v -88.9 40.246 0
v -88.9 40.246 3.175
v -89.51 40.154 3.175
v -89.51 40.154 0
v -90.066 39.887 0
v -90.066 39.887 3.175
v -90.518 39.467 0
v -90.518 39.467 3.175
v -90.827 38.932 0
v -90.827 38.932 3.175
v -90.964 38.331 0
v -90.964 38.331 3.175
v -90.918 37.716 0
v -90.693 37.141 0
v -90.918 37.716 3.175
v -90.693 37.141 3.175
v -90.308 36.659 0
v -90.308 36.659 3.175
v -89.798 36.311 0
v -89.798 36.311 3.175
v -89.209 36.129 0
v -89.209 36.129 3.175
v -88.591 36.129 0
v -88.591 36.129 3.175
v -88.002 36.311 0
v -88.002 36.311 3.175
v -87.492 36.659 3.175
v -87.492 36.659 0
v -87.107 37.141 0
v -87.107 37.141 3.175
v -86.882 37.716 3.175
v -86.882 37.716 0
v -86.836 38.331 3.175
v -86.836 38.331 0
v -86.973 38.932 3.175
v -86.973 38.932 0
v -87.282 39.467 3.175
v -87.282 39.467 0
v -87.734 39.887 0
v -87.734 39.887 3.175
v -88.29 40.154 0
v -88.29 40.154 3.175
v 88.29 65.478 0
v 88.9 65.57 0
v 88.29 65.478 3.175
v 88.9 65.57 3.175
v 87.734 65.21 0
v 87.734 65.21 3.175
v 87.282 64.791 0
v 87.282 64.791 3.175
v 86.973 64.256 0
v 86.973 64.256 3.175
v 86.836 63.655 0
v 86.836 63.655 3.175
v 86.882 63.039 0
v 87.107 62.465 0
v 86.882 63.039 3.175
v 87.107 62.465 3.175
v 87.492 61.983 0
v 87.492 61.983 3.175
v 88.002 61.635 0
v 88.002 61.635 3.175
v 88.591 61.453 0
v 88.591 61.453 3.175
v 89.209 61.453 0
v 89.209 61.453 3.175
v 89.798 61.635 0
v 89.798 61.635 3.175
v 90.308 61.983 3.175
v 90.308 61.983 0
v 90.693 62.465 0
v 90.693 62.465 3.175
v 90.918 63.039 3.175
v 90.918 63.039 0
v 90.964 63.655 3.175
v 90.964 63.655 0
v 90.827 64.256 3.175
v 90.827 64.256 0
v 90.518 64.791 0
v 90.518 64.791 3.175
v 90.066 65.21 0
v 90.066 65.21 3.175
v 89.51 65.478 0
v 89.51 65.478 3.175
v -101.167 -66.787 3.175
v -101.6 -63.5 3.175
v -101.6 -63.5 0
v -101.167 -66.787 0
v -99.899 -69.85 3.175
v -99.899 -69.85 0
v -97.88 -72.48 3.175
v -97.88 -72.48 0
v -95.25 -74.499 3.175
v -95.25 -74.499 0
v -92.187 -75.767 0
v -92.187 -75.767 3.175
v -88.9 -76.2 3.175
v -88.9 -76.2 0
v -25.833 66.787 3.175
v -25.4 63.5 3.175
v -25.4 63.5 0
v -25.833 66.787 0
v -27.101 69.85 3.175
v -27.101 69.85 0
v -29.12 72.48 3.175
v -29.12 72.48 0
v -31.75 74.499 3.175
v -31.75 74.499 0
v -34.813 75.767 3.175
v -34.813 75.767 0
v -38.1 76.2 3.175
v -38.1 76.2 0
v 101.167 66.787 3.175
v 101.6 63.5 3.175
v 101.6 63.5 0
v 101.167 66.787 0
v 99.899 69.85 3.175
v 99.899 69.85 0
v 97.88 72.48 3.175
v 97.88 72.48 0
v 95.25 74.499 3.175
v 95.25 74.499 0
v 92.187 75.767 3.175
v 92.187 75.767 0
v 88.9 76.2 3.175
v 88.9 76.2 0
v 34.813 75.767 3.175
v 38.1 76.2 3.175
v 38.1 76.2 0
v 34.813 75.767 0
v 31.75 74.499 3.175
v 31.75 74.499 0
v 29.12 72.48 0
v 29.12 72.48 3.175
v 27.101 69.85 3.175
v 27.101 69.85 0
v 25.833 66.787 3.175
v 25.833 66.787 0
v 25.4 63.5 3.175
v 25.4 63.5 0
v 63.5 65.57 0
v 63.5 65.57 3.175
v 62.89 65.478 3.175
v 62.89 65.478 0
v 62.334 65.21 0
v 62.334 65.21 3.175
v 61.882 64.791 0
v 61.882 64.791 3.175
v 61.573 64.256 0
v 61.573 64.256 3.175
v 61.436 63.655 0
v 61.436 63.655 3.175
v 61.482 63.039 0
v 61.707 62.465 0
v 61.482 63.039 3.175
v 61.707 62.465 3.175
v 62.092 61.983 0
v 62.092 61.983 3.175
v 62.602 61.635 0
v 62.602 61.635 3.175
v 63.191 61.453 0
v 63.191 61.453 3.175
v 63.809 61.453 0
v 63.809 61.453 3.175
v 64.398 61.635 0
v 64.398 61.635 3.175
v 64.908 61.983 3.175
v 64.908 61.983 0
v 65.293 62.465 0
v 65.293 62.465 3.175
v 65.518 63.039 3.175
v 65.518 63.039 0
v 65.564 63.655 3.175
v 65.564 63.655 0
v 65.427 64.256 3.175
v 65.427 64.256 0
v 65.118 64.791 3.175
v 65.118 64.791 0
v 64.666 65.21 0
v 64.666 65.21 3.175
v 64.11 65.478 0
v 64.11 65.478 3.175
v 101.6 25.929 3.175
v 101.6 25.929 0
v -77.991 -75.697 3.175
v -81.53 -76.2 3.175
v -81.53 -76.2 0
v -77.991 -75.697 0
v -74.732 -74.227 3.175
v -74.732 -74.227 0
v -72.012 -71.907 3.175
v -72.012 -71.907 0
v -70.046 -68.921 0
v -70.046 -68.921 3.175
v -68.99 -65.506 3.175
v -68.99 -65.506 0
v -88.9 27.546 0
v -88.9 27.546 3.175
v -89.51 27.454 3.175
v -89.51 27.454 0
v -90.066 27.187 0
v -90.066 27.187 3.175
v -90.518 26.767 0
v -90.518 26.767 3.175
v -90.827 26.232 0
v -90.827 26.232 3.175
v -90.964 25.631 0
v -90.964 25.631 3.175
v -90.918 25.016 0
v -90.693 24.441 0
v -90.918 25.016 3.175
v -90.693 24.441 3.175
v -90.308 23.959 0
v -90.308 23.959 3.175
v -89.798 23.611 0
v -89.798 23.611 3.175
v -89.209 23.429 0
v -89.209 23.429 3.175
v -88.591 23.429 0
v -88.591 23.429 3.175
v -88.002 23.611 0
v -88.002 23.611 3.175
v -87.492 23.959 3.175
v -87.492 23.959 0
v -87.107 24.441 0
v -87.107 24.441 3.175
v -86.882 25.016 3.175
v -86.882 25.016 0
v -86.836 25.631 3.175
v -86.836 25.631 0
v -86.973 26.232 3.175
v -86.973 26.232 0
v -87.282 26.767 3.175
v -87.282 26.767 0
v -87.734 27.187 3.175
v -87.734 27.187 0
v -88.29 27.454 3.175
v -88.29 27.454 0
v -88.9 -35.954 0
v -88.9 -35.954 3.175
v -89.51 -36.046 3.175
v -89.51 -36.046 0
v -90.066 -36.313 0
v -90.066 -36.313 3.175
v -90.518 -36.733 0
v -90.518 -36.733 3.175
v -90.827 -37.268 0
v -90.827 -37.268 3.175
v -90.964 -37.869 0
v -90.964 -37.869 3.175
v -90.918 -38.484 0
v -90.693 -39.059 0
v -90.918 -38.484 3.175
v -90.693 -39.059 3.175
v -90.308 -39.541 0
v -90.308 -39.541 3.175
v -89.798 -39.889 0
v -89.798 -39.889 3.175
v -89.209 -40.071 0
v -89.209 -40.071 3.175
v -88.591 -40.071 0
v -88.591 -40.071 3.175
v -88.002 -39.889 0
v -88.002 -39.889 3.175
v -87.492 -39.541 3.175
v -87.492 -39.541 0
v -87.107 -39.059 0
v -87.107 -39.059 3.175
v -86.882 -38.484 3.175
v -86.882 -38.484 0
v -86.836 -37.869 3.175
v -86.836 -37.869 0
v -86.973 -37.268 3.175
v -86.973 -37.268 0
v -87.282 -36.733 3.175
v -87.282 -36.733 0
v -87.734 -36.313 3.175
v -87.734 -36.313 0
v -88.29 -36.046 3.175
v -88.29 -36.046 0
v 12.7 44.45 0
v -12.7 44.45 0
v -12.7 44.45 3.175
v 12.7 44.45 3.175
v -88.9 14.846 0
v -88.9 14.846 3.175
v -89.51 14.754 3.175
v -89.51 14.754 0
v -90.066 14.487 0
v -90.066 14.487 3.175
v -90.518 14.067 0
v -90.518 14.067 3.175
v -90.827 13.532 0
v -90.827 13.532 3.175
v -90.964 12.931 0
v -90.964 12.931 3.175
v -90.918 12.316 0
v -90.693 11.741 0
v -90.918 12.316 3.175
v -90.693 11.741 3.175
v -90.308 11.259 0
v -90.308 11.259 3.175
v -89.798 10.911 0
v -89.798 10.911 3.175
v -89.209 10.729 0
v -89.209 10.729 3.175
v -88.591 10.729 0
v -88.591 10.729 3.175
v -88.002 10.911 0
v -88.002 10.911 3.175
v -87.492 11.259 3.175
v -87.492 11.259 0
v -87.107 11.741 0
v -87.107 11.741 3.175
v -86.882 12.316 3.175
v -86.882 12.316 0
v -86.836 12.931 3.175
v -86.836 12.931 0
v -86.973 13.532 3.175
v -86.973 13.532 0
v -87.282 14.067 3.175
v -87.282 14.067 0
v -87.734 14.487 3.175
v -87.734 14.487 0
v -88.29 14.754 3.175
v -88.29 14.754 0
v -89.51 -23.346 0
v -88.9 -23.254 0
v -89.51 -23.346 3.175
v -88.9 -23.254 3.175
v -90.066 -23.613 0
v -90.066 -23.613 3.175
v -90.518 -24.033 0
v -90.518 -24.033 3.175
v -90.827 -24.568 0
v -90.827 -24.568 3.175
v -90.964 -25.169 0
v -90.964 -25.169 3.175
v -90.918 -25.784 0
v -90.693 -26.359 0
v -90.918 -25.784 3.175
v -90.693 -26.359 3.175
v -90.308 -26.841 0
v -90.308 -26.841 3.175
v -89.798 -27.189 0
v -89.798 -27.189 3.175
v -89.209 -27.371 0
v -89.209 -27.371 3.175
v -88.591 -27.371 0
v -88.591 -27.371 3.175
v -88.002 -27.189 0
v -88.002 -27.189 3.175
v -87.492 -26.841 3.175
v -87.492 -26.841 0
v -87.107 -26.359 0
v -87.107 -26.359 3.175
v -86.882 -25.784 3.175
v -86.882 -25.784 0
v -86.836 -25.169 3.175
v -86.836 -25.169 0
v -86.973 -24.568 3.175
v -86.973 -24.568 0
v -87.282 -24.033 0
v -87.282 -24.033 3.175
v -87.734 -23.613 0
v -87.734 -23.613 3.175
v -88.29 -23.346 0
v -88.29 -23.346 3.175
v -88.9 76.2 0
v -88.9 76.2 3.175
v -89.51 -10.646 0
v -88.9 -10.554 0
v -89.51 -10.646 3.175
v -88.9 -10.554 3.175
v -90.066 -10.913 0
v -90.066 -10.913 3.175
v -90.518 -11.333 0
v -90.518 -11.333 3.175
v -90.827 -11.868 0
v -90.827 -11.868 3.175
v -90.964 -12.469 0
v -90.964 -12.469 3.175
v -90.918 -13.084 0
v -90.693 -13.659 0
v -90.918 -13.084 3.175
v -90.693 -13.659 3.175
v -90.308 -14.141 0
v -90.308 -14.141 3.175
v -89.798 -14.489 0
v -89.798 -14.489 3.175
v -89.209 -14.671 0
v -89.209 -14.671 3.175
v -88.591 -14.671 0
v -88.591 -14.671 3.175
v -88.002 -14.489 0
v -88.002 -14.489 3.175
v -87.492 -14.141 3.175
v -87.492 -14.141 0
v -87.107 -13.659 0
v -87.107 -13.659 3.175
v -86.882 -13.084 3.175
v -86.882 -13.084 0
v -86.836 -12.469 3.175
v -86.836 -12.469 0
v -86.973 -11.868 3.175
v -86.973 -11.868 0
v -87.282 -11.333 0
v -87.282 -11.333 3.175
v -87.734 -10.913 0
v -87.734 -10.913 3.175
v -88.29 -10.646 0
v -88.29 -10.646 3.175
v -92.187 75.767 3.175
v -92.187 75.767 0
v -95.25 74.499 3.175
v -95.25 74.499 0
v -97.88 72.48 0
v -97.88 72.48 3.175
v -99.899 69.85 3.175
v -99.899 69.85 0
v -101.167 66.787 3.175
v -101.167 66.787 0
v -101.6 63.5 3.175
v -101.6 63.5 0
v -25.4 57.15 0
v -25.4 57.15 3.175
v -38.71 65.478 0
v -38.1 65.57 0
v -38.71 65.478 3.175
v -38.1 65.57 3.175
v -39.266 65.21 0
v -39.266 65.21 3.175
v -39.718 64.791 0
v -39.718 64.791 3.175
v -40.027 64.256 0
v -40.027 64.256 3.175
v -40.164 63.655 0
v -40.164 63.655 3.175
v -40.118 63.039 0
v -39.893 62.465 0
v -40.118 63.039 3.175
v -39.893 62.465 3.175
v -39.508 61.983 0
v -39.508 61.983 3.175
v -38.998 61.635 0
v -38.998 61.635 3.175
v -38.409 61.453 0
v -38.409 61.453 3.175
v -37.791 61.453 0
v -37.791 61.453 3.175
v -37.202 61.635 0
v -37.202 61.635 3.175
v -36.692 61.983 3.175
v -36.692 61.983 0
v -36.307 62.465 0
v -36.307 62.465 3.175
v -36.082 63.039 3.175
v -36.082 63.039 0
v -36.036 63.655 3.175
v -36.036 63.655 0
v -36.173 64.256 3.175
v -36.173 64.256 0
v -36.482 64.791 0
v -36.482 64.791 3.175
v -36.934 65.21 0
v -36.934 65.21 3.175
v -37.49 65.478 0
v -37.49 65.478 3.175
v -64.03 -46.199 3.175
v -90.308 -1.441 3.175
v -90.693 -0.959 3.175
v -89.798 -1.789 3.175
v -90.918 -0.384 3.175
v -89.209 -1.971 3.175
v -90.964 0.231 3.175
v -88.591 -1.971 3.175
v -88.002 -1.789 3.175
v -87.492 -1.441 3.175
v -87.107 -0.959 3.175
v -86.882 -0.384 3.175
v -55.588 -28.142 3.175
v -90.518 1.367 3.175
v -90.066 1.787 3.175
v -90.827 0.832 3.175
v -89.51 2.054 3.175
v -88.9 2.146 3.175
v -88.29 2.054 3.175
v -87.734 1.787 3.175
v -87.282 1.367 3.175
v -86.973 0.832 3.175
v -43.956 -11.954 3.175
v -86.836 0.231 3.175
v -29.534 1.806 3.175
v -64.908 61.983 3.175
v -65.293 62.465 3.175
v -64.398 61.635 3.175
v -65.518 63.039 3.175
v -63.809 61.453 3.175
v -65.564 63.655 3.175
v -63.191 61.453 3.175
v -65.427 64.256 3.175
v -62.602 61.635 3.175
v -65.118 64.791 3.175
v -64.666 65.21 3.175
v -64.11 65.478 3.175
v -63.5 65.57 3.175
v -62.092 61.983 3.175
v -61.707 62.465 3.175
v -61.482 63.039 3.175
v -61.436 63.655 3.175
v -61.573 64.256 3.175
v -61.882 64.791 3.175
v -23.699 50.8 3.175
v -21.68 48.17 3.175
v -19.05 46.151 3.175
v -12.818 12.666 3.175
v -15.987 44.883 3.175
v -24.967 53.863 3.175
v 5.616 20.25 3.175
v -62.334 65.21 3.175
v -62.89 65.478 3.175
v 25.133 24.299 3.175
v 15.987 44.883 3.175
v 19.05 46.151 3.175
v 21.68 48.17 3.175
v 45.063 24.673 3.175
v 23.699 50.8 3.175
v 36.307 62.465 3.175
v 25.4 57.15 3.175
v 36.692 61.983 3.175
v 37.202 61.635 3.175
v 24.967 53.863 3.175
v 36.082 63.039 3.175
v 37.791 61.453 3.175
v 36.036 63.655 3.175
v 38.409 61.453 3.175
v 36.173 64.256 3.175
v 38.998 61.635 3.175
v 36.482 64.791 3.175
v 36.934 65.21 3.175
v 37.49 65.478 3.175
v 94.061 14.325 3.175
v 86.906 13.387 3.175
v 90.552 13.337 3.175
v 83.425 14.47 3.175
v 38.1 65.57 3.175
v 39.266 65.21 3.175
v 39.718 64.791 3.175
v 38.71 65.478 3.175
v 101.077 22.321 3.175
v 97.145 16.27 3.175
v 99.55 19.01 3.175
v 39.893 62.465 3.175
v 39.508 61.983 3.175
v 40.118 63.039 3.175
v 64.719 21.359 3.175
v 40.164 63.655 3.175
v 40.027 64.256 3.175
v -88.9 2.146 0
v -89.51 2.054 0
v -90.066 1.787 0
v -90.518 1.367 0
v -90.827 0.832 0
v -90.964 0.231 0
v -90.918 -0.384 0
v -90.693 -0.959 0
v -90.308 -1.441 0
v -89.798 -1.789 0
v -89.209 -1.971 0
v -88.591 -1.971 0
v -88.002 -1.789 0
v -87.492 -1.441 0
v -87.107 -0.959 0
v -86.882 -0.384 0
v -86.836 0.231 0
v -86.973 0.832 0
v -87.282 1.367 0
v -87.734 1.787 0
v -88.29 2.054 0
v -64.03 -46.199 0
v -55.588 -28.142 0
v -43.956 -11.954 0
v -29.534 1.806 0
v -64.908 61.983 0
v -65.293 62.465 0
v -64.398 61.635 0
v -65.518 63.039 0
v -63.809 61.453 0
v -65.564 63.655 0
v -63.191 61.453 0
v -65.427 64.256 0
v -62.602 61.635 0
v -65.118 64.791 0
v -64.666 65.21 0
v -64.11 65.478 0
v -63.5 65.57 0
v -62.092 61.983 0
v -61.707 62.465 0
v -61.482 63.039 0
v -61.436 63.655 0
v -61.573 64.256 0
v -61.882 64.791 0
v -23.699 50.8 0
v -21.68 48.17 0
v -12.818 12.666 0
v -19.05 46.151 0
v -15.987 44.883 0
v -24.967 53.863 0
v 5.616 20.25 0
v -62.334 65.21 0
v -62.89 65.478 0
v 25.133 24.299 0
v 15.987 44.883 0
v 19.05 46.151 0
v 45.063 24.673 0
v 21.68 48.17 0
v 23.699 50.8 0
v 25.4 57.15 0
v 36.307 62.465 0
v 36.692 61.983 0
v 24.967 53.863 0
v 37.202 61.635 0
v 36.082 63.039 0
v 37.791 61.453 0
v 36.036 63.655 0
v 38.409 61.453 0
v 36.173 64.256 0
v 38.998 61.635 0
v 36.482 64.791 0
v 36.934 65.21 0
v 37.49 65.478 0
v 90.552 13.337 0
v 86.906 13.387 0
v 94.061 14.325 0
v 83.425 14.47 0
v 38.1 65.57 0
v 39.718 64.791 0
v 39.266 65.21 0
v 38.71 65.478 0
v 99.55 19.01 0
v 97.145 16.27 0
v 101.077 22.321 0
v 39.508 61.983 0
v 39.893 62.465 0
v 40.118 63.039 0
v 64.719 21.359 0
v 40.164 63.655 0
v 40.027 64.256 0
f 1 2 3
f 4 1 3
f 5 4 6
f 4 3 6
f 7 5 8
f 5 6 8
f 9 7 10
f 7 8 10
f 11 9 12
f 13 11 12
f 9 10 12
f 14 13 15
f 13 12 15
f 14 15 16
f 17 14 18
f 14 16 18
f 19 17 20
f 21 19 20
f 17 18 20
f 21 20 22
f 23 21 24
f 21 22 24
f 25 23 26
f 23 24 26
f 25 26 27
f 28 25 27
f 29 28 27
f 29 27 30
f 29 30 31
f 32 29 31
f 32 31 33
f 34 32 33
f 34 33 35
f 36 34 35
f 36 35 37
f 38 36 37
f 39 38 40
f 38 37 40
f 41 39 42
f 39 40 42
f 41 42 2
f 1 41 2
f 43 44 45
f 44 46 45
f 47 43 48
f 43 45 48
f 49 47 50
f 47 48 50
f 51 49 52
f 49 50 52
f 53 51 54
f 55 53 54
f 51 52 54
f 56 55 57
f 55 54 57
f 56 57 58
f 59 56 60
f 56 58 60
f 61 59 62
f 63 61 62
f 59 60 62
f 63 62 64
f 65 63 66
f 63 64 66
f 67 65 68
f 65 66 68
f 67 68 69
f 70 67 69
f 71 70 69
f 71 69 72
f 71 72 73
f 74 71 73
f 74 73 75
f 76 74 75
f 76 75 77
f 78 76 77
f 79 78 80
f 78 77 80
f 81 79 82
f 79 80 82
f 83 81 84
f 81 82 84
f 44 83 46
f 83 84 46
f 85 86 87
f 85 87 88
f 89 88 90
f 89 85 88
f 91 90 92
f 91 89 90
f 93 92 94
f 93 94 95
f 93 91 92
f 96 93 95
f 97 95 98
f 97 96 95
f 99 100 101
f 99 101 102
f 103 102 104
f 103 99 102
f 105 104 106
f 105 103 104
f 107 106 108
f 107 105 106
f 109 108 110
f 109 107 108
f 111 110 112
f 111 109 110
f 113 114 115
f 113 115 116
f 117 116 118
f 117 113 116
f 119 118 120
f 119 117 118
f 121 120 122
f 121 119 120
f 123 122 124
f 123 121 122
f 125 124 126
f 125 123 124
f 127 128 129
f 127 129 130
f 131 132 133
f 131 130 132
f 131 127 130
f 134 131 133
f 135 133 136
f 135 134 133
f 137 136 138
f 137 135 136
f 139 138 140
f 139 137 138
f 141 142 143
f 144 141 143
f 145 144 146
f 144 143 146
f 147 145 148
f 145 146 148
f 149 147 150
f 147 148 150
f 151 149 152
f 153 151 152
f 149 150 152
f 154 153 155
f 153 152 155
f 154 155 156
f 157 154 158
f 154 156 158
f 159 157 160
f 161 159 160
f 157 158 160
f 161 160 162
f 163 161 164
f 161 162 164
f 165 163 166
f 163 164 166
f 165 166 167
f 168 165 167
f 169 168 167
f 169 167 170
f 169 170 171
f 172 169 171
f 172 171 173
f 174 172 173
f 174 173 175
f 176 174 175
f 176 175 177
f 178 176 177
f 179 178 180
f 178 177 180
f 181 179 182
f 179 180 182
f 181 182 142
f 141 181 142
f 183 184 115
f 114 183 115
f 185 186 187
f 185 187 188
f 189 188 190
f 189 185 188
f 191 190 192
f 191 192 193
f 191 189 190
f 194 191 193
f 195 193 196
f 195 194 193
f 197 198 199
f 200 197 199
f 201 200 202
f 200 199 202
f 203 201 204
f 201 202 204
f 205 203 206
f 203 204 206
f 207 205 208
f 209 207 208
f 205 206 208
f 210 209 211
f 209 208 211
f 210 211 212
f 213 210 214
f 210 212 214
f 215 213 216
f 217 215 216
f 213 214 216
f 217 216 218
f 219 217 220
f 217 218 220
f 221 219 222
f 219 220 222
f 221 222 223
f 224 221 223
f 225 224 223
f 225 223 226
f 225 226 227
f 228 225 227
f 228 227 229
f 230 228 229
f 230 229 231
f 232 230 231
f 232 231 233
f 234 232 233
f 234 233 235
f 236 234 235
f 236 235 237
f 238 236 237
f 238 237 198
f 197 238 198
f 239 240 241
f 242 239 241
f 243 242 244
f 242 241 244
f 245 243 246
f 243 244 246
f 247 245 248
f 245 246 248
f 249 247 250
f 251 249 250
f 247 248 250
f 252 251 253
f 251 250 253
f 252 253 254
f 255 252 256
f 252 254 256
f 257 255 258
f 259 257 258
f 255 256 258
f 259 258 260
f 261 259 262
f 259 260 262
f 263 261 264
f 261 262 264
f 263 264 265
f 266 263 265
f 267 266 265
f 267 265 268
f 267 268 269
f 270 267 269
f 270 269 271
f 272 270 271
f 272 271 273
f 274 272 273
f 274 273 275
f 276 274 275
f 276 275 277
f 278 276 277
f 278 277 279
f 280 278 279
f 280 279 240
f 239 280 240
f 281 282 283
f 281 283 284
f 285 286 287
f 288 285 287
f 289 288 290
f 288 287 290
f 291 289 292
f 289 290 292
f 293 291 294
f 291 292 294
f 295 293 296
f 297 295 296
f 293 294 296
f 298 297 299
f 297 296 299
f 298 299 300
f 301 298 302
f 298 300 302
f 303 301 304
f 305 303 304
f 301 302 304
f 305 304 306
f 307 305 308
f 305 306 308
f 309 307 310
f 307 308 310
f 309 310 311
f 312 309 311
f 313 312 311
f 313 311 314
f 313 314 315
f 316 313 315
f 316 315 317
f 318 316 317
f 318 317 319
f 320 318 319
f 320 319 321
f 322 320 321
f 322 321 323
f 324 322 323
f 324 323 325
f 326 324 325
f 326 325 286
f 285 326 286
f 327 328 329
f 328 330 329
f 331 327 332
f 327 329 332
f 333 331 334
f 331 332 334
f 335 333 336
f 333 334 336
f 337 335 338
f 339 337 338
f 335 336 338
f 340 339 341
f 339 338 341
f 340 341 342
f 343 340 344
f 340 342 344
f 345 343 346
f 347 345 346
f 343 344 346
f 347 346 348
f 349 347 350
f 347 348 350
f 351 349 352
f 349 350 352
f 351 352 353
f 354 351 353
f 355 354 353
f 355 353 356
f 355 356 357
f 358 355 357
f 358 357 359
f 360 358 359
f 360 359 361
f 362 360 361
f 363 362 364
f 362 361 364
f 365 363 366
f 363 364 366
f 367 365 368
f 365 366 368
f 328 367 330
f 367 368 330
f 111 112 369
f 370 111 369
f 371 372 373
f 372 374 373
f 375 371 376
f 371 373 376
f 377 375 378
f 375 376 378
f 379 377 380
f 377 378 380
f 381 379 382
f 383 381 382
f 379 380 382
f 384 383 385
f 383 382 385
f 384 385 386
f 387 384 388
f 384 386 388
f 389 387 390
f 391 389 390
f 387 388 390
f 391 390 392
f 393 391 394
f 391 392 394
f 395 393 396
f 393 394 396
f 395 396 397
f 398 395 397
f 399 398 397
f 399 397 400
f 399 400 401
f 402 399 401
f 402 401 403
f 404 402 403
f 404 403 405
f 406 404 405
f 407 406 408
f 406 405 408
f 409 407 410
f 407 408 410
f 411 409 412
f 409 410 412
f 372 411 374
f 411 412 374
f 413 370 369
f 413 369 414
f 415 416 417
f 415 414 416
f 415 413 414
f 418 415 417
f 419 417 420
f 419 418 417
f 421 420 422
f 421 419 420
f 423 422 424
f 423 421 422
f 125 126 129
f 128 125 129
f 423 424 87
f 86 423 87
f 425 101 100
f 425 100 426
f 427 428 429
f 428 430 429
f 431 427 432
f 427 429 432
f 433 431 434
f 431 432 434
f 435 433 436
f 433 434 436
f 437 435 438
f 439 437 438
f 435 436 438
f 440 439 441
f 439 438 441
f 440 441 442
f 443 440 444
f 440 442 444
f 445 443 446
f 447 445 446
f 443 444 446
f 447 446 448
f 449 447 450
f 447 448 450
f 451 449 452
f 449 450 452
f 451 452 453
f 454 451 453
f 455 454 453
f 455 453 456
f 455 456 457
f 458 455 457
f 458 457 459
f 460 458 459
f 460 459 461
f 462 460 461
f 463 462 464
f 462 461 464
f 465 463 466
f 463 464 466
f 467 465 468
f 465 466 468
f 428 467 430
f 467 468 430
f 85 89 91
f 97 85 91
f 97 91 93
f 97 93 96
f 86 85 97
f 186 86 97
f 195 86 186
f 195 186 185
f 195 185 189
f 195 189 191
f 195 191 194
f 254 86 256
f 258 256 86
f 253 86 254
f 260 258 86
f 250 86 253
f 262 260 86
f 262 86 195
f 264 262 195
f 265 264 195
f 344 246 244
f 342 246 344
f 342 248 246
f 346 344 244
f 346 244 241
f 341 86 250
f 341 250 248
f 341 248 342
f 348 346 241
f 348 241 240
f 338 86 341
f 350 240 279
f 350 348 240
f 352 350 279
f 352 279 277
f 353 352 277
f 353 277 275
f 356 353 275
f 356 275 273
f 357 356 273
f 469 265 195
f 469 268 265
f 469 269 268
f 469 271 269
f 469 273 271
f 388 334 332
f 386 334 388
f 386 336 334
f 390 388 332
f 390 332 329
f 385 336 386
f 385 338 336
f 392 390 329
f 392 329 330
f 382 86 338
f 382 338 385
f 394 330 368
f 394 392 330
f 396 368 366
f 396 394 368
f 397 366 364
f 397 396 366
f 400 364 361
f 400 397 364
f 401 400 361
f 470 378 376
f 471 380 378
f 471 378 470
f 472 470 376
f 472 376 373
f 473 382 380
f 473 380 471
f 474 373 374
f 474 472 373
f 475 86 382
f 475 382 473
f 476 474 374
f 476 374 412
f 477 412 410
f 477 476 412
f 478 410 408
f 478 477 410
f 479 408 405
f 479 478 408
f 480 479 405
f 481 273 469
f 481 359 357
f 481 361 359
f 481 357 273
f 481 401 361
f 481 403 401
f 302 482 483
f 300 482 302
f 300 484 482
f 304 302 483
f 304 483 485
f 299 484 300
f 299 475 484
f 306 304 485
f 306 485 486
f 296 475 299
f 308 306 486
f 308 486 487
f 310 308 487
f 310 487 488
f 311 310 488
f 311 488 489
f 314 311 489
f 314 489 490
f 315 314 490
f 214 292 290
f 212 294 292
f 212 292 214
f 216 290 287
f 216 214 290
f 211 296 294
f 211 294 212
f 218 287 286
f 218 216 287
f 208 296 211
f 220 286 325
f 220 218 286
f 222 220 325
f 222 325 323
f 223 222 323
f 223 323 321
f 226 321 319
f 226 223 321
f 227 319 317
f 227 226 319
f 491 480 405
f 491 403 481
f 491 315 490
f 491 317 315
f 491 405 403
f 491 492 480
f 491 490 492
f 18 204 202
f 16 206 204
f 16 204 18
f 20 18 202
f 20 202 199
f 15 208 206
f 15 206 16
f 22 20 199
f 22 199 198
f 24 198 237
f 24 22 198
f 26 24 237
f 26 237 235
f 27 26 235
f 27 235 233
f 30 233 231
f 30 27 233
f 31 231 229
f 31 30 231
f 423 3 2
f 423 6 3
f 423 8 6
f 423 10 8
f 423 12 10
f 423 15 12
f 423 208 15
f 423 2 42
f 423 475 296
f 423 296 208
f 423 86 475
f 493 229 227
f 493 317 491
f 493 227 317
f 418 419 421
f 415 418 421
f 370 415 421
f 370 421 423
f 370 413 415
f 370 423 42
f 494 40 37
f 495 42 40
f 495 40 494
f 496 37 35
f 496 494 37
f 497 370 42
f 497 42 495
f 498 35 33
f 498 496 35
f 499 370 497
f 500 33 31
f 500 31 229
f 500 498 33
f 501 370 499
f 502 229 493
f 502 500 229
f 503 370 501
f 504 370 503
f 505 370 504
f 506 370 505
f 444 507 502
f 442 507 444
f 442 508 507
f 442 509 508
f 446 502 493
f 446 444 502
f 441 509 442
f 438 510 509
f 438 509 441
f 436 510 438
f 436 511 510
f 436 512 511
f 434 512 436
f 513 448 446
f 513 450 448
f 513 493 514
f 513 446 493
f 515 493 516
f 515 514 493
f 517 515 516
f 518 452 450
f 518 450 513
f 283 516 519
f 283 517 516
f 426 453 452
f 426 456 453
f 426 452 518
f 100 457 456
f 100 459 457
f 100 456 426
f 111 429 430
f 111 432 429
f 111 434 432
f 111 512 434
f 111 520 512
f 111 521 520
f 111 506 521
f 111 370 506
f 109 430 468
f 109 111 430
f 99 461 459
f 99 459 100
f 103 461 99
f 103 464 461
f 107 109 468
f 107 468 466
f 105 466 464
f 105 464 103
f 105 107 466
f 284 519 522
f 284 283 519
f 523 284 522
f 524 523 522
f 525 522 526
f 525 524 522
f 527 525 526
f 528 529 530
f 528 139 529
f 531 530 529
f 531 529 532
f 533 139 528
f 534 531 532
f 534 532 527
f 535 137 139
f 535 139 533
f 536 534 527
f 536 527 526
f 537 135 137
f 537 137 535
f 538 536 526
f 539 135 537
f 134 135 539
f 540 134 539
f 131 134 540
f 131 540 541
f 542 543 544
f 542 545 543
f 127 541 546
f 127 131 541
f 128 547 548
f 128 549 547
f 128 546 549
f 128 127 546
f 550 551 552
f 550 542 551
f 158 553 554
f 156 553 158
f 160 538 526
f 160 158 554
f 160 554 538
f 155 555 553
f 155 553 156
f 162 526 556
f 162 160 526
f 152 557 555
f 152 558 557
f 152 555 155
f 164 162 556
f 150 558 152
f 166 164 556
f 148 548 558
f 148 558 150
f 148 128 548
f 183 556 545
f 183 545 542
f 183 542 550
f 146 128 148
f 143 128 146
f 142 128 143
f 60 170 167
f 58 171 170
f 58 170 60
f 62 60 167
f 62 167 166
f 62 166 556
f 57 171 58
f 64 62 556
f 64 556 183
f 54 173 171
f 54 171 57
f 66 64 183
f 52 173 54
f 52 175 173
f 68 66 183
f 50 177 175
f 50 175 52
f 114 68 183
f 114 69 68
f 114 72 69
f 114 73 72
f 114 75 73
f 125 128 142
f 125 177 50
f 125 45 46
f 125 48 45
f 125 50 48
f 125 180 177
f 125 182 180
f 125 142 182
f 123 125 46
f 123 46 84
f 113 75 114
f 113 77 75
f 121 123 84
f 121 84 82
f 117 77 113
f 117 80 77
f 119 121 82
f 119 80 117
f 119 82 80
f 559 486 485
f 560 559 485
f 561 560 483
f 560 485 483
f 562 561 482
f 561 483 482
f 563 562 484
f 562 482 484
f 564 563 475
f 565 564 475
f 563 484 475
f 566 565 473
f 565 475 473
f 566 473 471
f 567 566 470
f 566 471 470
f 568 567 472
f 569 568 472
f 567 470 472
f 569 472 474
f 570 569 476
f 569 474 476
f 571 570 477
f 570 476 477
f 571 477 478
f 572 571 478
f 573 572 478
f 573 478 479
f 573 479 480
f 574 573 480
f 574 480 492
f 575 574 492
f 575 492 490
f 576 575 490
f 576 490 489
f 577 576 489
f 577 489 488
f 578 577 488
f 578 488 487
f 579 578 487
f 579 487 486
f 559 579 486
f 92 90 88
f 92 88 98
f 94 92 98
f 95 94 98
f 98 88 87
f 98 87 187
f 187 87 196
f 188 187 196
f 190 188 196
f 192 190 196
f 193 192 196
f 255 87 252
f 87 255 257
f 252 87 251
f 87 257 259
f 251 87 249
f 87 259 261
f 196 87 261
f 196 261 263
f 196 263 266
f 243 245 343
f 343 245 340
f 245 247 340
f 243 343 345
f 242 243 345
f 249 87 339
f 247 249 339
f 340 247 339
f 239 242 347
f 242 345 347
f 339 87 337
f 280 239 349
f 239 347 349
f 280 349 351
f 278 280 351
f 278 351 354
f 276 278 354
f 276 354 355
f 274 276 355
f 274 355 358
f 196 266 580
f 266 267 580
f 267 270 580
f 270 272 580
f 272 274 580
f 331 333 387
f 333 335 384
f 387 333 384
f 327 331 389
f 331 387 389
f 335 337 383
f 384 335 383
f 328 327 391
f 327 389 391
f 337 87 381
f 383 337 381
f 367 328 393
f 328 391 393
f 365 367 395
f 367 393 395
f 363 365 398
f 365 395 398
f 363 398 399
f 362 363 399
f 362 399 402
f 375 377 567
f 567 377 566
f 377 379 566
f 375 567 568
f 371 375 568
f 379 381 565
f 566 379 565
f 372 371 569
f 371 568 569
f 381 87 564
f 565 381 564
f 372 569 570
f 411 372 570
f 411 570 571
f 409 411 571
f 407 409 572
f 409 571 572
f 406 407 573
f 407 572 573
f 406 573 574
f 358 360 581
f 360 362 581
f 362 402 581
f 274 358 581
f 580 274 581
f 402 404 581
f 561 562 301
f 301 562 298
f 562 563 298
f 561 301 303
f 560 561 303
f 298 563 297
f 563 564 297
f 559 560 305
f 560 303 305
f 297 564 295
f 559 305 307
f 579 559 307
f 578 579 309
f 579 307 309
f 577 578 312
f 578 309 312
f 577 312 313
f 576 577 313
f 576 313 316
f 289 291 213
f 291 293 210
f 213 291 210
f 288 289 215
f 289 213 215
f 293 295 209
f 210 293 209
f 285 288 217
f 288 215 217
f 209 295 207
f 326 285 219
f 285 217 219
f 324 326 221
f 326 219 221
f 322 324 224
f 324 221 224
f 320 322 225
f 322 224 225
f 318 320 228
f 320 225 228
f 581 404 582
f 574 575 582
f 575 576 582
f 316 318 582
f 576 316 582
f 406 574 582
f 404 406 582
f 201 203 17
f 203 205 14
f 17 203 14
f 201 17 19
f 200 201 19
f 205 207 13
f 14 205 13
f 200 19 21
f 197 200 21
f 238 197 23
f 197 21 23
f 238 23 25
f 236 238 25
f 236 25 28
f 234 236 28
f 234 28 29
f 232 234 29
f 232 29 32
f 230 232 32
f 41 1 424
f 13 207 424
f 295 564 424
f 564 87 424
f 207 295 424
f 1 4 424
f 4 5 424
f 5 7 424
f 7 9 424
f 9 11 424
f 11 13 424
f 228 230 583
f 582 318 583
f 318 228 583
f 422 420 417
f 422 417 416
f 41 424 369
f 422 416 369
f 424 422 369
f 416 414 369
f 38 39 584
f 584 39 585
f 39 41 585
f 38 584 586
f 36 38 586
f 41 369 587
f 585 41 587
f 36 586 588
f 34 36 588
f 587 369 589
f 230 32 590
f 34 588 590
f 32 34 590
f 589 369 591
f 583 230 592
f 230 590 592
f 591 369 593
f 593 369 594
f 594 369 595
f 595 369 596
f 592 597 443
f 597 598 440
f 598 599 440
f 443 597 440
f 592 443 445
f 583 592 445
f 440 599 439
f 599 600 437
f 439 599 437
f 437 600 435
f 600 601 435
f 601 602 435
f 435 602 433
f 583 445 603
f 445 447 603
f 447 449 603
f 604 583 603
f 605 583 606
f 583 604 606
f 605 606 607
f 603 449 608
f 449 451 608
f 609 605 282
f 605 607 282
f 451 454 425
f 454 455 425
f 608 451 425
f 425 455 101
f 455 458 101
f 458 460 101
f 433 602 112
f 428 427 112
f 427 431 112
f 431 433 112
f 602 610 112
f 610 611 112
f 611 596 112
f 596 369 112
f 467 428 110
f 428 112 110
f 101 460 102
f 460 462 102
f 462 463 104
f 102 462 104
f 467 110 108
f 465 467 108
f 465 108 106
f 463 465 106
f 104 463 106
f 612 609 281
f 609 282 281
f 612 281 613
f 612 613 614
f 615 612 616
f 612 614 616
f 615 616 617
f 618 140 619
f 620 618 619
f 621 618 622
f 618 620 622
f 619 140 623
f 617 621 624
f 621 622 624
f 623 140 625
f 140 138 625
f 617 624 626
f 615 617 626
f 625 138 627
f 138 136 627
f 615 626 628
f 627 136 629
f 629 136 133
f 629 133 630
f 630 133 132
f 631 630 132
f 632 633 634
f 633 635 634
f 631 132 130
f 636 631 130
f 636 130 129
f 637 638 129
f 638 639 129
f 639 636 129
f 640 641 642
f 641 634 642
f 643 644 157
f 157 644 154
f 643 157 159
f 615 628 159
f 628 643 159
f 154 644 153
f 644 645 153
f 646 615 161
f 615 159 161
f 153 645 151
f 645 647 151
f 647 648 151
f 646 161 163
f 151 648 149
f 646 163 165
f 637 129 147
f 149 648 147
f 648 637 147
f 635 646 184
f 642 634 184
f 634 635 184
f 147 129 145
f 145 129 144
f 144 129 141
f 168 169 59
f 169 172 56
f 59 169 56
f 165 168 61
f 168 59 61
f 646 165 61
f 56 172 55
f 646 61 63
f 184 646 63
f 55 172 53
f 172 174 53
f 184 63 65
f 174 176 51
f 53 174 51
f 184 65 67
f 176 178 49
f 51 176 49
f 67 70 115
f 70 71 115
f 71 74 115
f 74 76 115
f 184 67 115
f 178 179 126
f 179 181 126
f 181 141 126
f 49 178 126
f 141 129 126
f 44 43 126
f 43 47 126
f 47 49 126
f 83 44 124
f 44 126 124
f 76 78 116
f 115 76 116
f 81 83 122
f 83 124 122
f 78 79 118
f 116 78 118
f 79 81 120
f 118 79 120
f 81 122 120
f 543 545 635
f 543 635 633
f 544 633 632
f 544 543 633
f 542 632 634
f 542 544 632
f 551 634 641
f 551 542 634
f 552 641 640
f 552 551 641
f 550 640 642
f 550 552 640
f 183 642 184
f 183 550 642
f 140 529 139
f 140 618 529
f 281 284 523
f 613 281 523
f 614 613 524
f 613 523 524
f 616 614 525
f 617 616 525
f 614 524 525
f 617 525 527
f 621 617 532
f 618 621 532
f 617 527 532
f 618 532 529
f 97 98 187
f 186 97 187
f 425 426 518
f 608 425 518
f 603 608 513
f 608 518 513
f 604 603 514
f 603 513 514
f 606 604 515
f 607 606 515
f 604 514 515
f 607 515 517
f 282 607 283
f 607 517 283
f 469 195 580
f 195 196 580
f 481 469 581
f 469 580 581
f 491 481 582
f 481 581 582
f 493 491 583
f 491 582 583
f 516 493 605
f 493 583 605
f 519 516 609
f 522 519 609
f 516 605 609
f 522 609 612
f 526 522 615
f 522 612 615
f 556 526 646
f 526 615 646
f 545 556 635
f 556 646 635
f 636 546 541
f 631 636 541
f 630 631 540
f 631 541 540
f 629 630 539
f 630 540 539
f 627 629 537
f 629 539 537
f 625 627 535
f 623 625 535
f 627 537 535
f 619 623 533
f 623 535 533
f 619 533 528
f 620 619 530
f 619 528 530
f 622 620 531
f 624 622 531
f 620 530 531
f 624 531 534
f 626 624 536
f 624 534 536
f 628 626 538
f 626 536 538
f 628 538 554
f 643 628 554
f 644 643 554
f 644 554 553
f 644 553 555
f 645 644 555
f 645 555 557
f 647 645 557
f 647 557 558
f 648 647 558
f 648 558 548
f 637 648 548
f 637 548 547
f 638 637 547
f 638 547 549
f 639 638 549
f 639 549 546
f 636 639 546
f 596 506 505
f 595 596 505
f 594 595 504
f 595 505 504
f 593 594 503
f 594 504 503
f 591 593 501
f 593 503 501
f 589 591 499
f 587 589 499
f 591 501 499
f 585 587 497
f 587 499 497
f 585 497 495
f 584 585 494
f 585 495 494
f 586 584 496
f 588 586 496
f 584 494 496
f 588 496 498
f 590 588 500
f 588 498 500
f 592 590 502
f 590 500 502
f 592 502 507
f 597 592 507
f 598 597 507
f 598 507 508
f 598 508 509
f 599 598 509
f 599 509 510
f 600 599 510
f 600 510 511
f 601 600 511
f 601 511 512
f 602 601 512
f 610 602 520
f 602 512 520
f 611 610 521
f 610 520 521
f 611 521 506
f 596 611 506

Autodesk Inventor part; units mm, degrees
ref_plane "YZ Plane" through (0, 0, 0) normal (1, 0, 0) x (0, 1, 0)
ref_plane "XZ Plane" through (0, 0, 0) normal (0, 1, 0) x (-1, 0, 0)
ref_plane "XY Plane" through (0, 0, 0) normal (0, 0, 1) x (1, 0, 0)
sketch "Sketch1" plane through (0, 0, 0) normal (0, 0, 1) x (1, 0, 0)
  line L0 (-101.6, -76.2) -> (101.6, -76.2)
  line L1 (101.6, -76.2) -> (101.6, 76.2)
  line L2 (101.6, 76.2) -> (-101.6, 76.2)
  line L3 (-101.6, 76.2) -> (-101.6, -76.2)
  line L4 (-101.6, -76.2) -> (101.6, 76.2) construction
  line L5 (101.6, -76.2) -> (-101.6, 76.2) construction
  point P0 (0, 0)
  dimension "d0" = 152.4
  dimension "d1" = 203.2
extrude "Extrusion1" add sketch "Sketch1" along normal blind 3.175
sketch "Sketch2" plane through (0, 0, 0) normal (0, 0, -1) x (-1, 0, 0)
  circle A0 centre (-37.1038, -82.4738) radius 101.092
  circle A1 centre (-37.1038, -82.4738) radius 107.442
  line L0 (-101.6, -76.2) -> (-101.6, 76.2) projected
  line L1 (-101.6, 3.4565) -> (-101.6, -76.2)
  line L2 (-101.6, -76.2) -> (70.1549, -76.2)
  line L3 (101.6, -76.2) -> (-101.6, -76.2) projected
  point P0 (0, 0)
  dimension "d4" = 214.884
extrude "Extrusion2" cut sketch "Sketch2" against normal blind 25.4 contours L2 L0 A0 | A0 L0 A1 L2 picked at (8.0579, -71.6086) picked at (67.4292, -71.4153)
fillet "Fillet1" radius 12.7 5 edges at (101.6, 76.2, 1.5875) (-101.6, 76.2, 1.5875) (-101.6, -76.2, 1.5875) (-70.1549, -76.2, 1.5875) (101.6, 3.4565, 1.5875)
sketch "Sketch3" plane through (0, 0, 0) normal (0, 0, -1) x (-1, 0, 0)
  line L0 (76.2027, 73.1012) -> (-660.4, 73.1012) projected
  line L1 (-660.4, 53.8988) -> (76.2027, 53.8988) projected
  circle A0 centre (-647.7, 63.5) radius 2.0701 projected
  circle A1 centre (-622.3, 63.5) radius 2.0701 projected
  circle A2 centre (-596.9, 63.5) radius 2.0701 projected
  circle A3 centre (-571.5, 63.5) radius 2.0701 projected
  circle A4 centre (-546.1, 63.5) radius 2.0701 projected
  circle A5 centre (-520.7, 63.5) radius 2.0701 projected
  circle A6 centre (-495.3, 63.5) radius 2.0701 projected
  circle A7 centre (-469.9, 63.5) radius 2.0701 projected
  circle A8 centre (-444.5, 63.5) radius 2.0701 projected
  circle A9 centre (-419.1, 63.5) radius 2.0701 projected
  circle A10 centre (-393.7, 63.5) radius 2.0701 projected
  circle A11 centre (-368.3, 63.5) radius 2.0701 projected
  circle A12 centre (-342.9, 63.5) radius 2.0701 projected
  circle A13 centre (-317.5, 63.5) radius 2.0701 projected
  circle A14 centre (-292.1, 63.5) radius 2.0701 projected
  circle A15 centre (-266.7, 63.5) radius 2.0701 projected
  circle A16 centre (-241.3, 63.5) radius 2.0701 projected
  circle A17 centre (-215.9, 63.5) radius 2.0701 projected
  circle A18 centre (-190.5, 63.5) radius 2.0701 projected
  circle A19 centre (-165.1, 63.5) radius 2.0701 projected
  circle A20 centre (-139.7, 63.5) radius 2.0701 projected
  circle A21 centre (-114.3, 63.5) radius 2.0701 projected
  circle A22 centre (-88.9, 63.5) radius 2.0701 projected
  circle A23 centre (-63.5, 63.5) radius 2.0701 projected
  circle A24 centre (-38.1, 63.5) radius 2.0701 projected
  circle A25 centre (-12.7, 63.5) radius 2.0701 projected
  circle A26 centre (12.7, 63.5) radius 2.0701 projected
  circle A27 centre (38.1, 63.5) radius 2.0701 projected
  circle A28 centre (63.5, 63.5) radius 2.0701 projected
  line L2 (97.2058, -44.2468) -> (78.359, -44.2468) projected
  line L3 (78.359, -44.2468) -> (76.2, -42.0878) projected
  line L4 (76.2, 16.8402) -> (76.2, -42.0878) projected
  line L5 (76.2, 16.8402) -> (78.359, 18.9992) projected
  line L6 (97.2058, 18.9992) -> (78.359, 18.9992) projected
  line L7 (97.2058, -44.2468) -> (97.2058, 18.9992) projected
  circle A29 centre (88.9, 12.7762) radius 2.0701 projected
  circle A30 centre (88.9, 0.0762) radius 2.0701 projected
  circle A31 centre (88.9, -12.6238) radius 2.0701 projected
  circle A32 centre (88.9, -25.3238) radius 2.0701 projected
  circle A33 centre (88.9, -38.0238) radius 2.0701 projected
  line L8 (76.2027, 73.1012) -> (76.2027, 53.8988) projected
  line L9 (-660.4, 53.8988) -> (-660.4, 73.1012) projected
  point P0 (0, 0)
  point P1 (88.9, 25.4762)
  point P2 (88.9, 38.1762)
  dimension "d17" = 12.7
hole "Hole1" at (88.9, 63.5, 0) at (63.5, 63.5, 0) at (38.1, 63.5, 0) at (12.7, 63.5, 0) at (-12.7, 63.5, 0) at (-38.1, 63.5, 0) at (-63.5, 63.5, 0) at (-88.9, 12.7762, 0) at (-88.9, 0.0762, 0) at (-88.9, -12.6238, 0) at (-88.9, -25.3238, 0) at (-88.9, -38.0238, 0) at (-88.9, 25.4762, 0) at (-88.9, 38.1762, 0) direction (0, 0, 1) diameter 4.1402 end through all
sketch "Sketch4" plane through (0, 0, 0) normal (0, 0, -1) x (-1, 0, 0)
  line L0 (-88.9, 76.2) -> (88.9, 76.2) projected
  line L1 (-25.4, 76.2) -> (25.4, 76.2)
  line L2 (25.4, 76.2) -> (25.4, 44.45)
  line L3 (25.4, 44.45) -> (-25.4, 44.45)
  line L4 (-25.4, 44.45) -> (-25.4, 76.2)
  line L5 (-101.6, 25.9294) -> (-101.6, 63.5) projected
  point P0 (0, 0)
  dimension "d23" = 31.75
  dimension "d24" = 50.8
  dimension "d25" = 76.2
extrude "Extrusion3" cut sketch "Sketch4" against normal through all
fillet "Fillet2" radius 12.7 4 edges at (25.4, 76.2, 1.5875) (25.4, 44.45, 1.5875) (-25.4, 44.45, 1.5875) (-25.4, 76.2, 1.5875)
properties part number "C13_TK_UpperFrameSupportWheel" material "Polycarbonate, Clear"
